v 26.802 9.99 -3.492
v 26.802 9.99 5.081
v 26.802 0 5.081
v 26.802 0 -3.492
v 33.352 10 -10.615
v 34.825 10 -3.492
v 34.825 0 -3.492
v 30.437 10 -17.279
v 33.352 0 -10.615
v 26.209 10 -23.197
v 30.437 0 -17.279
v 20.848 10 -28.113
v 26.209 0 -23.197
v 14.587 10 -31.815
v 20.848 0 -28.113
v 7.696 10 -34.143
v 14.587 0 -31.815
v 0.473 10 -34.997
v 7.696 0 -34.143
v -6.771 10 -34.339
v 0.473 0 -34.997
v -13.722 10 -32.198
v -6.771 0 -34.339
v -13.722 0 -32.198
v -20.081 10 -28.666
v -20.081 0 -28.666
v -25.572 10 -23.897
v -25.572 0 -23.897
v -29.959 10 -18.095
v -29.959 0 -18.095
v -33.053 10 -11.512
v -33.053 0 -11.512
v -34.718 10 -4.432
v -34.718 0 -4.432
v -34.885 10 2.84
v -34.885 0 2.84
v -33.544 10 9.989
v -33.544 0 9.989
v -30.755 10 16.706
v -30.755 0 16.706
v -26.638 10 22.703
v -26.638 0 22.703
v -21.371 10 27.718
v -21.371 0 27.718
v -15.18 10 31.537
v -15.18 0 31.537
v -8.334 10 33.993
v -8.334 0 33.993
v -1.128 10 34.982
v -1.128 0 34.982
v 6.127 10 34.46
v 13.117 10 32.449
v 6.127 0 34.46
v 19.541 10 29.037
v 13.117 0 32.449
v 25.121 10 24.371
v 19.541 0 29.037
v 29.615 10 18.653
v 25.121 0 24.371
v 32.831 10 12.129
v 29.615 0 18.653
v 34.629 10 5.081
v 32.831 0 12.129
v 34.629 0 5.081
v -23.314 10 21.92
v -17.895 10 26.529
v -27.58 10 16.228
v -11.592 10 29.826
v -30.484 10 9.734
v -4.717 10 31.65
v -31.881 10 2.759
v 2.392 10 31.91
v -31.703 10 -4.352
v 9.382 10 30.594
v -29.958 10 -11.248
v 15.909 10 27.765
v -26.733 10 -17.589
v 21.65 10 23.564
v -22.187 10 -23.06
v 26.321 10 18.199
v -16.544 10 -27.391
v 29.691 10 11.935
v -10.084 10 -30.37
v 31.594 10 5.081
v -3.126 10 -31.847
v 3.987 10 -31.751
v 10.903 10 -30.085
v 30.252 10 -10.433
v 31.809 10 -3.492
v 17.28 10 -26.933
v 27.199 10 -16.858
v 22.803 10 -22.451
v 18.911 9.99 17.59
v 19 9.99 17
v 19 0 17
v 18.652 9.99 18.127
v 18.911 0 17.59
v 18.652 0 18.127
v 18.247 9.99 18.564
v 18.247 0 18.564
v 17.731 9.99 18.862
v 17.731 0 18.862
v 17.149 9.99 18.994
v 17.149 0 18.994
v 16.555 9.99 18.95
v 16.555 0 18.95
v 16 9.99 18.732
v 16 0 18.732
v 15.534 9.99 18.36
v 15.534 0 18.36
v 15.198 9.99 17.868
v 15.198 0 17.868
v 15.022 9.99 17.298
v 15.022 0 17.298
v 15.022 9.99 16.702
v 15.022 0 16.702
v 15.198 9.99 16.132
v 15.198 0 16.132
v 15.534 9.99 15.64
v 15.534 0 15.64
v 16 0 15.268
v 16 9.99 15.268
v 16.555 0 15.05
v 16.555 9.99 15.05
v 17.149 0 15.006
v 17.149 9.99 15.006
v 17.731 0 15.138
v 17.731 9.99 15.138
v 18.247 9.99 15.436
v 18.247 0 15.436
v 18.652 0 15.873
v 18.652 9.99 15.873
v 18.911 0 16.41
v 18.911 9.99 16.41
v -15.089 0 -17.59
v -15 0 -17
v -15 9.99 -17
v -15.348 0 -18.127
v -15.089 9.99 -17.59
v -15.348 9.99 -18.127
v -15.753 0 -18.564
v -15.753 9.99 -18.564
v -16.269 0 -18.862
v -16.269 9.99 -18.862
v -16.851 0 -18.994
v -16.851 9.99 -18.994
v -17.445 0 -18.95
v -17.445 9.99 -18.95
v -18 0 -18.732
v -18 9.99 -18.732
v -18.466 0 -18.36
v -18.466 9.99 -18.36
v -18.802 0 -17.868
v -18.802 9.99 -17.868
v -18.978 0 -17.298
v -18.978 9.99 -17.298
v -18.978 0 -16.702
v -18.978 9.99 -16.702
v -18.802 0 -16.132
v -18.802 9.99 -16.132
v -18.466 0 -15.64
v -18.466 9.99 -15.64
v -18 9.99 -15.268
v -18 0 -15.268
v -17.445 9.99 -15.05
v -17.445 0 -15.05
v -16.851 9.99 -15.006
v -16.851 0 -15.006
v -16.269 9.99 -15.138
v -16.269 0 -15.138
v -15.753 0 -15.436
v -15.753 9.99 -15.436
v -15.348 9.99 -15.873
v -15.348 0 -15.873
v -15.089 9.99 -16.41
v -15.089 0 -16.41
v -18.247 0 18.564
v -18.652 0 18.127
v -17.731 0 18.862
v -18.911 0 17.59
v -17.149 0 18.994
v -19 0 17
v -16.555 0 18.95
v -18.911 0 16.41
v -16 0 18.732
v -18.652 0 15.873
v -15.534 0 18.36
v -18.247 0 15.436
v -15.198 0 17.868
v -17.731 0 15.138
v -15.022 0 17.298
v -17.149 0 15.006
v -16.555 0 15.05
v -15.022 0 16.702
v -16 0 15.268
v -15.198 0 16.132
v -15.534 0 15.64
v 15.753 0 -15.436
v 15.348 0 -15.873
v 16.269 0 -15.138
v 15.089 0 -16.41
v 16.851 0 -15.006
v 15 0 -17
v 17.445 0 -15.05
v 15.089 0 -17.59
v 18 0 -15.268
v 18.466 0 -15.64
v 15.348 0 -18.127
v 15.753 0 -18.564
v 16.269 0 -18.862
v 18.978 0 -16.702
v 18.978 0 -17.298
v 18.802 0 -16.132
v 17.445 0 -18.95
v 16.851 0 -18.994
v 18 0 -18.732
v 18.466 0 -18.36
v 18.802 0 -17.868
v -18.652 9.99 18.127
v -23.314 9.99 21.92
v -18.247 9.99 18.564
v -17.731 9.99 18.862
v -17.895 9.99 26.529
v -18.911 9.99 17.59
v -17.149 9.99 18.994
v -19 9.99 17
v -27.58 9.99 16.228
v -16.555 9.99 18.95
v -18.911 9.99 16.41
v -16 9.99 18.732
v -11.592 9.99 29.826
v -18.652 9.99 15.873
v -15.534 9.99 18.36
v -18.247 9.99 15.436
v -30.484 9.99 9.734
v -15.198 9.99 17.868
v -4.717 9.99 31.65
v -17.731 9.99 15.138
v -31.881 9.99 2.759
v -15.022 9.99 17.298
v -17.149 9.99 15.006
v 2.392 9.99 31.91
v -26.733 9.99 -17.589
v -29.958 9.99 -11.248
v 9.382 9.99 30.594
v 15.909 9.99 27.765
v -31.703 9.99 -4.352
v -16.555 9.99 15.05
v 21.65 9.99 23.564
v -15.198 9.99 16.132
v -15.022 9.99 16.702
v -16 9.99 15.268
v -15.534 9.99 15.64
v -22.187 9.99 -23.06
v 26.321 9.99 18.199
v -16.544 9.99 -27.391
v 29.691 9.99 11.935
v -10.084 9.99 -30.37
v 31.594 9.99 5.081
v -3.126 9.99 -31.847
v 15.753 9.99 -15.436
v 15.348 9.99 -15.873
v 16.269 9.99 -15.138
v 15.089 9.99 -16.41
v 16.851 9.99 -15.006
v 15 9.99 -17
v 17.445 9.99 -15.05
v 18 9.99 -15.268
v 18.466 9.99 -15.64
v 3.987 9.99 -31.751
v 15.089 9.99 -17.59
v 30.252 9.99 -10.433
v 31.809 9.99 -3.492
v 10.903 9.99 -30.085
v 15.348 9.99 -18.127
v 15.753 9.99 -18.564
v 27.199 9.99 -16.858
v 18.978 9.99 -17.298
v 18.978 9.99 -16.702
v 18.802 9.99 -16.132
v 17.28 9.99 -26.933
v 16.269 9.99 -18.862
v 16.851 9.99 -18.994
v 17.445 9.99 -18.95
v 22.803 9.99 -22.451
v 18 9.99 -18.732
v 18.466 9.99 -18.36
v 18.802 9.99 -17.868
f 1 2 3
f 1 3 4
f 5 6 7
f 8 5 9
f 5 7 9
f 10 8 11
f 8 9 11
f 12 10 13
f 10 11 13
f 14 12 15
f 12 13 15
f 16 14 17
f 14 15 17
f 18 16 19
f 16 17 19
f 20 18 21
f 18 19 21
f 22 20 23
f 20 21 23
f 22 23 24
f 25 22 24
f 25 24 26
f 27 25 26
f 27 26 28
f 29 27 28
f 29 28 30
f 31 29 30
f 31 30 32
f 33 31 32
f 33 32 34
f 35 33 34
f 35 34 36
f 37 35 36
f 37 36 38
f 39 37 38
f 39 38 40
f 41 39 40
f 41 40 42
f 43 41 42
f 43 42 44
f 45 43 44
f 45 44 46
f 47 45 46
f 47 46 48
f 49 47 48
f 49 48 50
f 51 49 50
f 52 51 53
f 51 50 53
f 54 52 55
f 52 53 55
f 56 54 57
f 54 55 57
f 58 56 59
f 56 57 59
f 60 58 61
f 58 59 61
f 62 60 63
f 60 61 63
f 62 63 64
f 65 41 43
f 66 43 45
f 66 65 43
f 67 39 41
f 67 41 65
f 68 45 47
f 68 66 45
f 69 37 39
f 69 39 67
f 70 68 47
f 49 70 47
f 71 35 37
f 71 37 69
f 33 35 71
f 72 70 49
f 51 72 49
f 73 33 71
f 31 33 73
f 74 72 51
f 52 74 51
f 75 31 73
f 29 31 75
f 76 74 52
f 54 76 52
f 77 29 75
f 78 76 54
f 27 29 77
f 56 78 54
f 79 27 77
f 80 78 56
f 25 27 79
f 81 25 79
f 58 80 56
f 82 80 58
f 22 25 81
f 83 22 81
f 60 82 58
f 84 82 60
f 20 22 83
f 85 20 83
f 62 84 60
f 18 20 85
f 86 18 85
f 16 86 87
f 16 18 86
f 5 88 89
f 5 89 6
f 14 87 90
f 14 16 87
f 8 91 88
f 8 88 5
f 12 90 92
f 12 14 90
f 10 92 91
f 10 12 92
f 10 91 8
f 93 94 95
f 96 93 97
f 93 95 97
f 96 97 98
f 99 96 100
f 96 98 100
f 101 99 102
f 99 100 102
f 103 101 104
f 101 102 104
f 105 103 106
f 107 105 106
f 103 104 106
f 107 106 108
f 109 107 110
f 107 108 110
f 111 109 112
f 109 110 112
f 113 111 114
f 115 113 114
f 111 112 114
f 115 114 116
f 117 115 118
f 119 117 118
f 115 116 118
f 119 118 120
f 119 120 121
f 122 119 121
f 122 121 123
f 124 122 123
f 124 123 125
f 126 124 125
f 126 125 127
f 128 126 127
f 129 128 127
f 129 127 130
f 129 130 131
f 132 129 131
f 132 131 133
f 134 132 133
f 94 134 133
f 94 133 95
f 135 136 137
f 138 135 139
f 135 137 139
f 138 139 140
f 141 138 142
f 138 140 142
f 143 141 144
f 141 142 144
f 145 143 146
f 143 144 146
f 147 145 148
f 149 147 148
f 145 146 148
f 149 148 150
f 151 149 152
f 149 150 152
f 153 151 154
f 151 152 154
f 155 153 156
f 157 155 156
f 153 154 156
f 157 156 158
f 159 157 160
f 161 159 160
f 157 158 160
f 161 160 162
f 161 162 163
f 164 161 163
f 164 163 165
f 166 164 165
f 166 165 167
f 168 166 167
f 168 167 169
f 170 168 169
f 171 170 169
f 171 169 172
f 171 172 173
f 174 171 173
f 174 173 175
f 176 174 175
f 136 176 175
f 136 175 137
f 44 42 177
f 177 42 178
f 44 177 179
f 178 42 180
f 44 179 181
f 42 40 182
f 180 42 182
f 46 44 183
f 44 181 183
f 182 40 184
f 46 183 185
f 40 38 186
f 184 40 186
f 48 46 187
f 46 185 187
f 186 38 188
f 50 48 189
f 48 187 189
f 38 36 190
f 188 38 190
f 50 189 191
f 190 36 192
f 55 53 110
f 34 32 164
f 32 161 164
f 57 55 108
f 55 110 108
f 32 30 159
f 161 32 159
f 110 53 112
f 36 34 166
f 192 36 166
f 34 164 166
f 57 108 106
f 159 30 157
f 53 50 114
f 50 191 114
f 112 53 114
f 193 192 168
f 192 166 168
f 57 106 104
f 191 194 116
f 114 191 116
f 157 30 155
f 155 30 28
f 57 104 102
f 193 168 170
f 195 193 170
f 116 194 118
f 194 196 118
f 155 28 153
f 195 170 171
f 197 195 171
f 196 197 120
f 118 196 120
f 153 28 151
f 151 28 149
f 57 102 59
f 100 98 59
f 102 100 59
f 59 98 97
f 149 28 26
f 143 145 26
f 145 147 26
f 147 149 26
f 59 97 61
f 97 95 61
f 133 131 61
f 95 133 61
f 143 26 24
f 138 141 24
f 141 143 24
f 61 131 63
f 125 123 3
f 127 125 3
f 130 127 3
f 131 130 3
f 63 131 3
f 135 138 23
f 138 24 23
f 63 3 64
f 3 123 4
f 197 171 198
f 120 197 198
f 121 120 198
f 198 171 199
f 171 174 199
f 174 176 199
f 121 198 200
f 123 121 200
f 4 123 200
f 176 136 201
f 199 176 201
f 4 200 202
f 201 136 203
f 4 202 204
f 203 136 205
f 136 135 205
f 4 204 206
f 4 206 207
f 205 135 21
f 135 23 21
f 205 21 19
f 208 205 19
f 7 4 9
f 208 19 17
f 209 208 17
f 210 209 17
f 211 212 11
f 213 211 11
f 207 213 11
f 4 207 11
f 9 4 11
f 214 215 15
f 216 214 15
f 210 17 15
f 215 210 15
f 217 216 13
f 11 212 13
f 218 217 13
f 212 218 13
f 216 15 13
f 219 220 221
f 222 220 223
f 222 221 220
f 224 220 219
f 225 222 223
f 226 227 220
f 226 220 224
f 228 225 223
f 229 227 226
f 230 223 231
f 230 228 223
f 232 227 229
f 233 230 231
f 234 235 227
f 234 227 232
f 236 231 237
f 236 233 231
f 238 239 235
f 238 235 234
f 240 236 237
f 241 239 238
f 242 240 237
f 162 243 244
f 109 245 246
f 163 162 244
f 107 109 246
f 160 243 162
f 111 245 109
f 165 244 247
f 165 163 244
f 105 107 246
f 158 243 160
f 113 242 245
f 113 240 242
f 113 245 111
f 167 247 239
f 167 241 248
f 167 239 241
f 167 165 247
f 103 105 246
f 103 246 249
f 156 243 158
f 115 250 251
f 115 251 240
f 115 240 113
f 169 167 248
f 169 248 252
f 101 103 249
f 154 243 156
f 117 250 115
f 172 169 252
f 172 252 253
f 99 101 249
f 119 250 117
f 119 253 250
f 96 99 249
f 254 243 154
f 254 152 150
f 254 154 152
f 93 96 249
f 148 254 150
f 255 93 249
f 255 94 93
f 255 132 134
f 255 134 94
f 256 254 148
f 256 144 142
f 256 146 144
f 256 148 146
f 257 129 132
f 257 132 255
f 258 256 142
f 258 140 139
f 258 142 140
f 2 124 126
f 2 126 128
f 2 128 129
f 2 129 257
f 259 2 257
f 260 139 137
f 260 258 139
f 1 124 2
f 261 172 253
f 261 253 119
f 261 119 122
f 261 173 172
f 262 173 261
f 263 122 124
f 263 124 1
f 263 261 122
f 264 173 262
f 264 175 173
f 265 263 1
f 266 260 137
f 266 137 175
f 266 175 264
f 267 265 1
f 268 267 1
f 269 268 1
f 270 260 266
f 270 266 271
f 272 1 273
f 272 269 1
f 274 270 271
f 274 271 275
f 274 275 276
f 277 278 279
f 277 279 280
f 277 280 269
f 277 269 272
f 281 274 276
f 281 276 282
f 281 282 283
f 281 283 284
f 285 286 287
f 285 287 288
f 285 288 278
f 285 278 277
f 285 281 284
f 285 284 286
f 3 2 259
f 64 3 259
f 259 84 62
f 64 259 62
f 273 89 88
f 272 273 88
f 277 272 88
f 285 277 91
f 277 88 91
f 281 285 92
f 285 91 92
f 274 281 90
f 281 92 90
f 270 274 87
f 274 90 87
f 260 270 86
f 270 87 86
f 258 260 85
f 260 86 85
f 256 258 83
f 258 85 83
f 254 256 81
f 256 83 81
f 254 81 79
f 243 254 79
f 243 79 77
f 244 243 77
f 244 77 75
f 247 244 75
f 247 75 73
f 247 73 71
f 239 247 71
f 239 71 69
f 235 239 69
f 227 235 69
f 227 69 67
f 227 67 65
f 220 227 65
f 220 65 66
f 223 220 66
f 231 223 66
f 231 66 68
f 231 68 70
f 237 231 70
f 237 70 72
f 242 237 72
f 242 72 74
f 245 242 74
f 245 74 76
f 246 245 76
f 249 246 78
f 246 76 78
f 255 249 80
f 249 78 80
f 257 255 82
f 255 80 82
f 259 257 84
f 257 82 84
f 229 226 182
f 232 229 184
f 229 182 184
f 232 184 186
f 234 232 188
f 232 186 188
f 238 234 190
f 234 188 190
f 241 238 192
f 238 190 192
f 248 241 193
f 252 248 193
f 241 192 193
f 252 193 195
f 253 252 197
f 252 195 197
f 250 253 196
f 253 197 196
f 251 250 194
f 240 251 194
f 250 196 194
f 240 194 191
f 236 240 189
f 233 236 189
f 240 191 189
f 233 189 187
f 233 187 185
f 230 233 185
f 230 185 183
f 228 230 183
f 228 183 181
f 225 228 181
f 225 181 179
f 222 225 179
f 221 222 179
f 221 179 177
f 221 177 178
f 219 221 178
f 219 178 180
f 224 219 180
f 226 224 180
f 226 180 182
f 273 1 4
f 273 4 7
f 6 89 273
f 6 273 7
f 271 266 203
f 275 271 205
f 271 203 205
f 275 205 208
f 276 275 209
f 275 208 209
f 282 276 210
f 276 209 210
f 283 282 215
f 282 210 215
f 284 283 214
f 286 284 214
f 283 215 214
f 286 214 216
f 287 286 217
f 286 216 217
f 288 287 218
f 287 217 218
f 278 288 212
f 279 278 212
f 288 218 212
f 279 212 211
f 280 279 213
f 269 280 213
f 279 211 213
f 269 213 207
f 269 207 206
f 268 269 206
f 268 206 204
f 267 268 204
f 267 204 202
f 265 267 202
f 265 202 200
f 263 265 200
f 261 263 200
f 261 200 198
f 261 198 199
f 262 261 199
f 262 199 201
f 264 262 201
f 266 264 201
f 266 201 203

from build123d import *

# Parameters (mm, degrees)
SKETCH1_R               = 35
BOSS_EXTRUDE1_DEPTH     = 10
SKETCH27_W              = 8.45046724
SKETCH27_H              = 8.572937779
CUT_EXTRUDE8_DEPTH      = 11
SKETCH34_R              = 2
CUT_EXTRUDE9_DEPTH      = 1
CUT_EXTRUDE9_DEPTH_BACK = 11
SKETCH35_R              = 2
CUT_EXTRUDE10_DEPTH     = 11
SKETCH36_R              = 2
CUT_EXTRUDE11_DEPTH     = 11
SKETCH37_R              = 2
CUT_EXTRUDE12_DEPTH     = 11
SKETCH39_R              = 32
CUT_EXTRUDE14_DEPTH     = 0.01


with BuildPart() as part:
    # Sketch1 → Boss-Extrude1 (new body)
    with BuildSketch(Plane(origin=(0, 0, 0), x_dir=(1, 0, 0), z_dir=(0, 1, 0))):
        Circle(SKETCH1_R)
    extrude(amount=BOSS_EXTRUDE1_DEPTH)

    # Sketch27 → Cut-Extrude8 (cut, through all)
    with BuildSketch(Plane(origin=(0, 10, 0), x_dir=(1, 0, 0), z_dir=(0, 1, 0))):
        with Locations((31.027560582, -0.794372815)):
            Rectangle(SKETCH27_W, SKETCH27_H)
    extrude(amount=-CUT_EXTRUDE8_DEPTH, mode=Mode.SUBTRACT)

    # Sketch34 → Cut-Extrude9 (cut, two sides)
    with BuildSketch(Plane(origin=(0, 10, 0), x_dir=(1, 0, 0), z_dir=(0, 1, 0))) as cut_extrude9_sk:
        with Locations((-17, 17)):
            Circle(SKETCH34_R)
    extrude(amount=CUT_EXTRUDE9_DEPTH, mode=Mode.SUBTRACT)
    extrude(cut_extrude9_sk.sketch, amount=-CUT_EXTRUDE9_DEPTH_BACK, mode=Mode.SUBTRACT)

    # Sketch35 → Cut-Extrude10 (cut, through all)
    with BuildSketch(Plane(origin=(0, 0, 0), x_dir=(-1, 0, 0), z_dir=(0, -1, 0))):
        with Locations((-17, 17)):
            Circle(SKETCH35_R)
    extrude(amount=-CUT_EXTRUDE10_DEPTH, mode=Mode.SUBTRACT)

    # Sketch36 → Cut-Extrude11 (cut, through all)
    with BuildSketch(Plane(origin=(0, 0, 0), x_dir=(-1, 0, 0), z_dir=(0, -1, 0))):
        with Locations((17, -17)):
            Circle(SKETCH36_R)
    extrude(amount=-CUT_EXTRUDE11_DEPTH, mode=Mode.SUBTRACT)

    # Sketch37 → Cut-Extrude12 (cut, through all)
    with BuildSketch(Plane.XZ):
        with Locations((17, 17)):
            Circle(SKETCH37_R)
    extrude(amount=-CUT_EXTRUDE12_DEPTH, mode=Mode.SUBTRACT)

    # Sketch39 → Cut-Extrude14 (cut)
    with BuildSketch(Plane(origin=(0, 10, 0), x_dir=(1, 0, 0), z_dir=(0, 1, 0))):
        Circle(SKETCH39_R)
    extrude(amount=-CUT_EXTRUDE14_DEPTH, mode=Mode.SUBTRACT)


solid = part.part
